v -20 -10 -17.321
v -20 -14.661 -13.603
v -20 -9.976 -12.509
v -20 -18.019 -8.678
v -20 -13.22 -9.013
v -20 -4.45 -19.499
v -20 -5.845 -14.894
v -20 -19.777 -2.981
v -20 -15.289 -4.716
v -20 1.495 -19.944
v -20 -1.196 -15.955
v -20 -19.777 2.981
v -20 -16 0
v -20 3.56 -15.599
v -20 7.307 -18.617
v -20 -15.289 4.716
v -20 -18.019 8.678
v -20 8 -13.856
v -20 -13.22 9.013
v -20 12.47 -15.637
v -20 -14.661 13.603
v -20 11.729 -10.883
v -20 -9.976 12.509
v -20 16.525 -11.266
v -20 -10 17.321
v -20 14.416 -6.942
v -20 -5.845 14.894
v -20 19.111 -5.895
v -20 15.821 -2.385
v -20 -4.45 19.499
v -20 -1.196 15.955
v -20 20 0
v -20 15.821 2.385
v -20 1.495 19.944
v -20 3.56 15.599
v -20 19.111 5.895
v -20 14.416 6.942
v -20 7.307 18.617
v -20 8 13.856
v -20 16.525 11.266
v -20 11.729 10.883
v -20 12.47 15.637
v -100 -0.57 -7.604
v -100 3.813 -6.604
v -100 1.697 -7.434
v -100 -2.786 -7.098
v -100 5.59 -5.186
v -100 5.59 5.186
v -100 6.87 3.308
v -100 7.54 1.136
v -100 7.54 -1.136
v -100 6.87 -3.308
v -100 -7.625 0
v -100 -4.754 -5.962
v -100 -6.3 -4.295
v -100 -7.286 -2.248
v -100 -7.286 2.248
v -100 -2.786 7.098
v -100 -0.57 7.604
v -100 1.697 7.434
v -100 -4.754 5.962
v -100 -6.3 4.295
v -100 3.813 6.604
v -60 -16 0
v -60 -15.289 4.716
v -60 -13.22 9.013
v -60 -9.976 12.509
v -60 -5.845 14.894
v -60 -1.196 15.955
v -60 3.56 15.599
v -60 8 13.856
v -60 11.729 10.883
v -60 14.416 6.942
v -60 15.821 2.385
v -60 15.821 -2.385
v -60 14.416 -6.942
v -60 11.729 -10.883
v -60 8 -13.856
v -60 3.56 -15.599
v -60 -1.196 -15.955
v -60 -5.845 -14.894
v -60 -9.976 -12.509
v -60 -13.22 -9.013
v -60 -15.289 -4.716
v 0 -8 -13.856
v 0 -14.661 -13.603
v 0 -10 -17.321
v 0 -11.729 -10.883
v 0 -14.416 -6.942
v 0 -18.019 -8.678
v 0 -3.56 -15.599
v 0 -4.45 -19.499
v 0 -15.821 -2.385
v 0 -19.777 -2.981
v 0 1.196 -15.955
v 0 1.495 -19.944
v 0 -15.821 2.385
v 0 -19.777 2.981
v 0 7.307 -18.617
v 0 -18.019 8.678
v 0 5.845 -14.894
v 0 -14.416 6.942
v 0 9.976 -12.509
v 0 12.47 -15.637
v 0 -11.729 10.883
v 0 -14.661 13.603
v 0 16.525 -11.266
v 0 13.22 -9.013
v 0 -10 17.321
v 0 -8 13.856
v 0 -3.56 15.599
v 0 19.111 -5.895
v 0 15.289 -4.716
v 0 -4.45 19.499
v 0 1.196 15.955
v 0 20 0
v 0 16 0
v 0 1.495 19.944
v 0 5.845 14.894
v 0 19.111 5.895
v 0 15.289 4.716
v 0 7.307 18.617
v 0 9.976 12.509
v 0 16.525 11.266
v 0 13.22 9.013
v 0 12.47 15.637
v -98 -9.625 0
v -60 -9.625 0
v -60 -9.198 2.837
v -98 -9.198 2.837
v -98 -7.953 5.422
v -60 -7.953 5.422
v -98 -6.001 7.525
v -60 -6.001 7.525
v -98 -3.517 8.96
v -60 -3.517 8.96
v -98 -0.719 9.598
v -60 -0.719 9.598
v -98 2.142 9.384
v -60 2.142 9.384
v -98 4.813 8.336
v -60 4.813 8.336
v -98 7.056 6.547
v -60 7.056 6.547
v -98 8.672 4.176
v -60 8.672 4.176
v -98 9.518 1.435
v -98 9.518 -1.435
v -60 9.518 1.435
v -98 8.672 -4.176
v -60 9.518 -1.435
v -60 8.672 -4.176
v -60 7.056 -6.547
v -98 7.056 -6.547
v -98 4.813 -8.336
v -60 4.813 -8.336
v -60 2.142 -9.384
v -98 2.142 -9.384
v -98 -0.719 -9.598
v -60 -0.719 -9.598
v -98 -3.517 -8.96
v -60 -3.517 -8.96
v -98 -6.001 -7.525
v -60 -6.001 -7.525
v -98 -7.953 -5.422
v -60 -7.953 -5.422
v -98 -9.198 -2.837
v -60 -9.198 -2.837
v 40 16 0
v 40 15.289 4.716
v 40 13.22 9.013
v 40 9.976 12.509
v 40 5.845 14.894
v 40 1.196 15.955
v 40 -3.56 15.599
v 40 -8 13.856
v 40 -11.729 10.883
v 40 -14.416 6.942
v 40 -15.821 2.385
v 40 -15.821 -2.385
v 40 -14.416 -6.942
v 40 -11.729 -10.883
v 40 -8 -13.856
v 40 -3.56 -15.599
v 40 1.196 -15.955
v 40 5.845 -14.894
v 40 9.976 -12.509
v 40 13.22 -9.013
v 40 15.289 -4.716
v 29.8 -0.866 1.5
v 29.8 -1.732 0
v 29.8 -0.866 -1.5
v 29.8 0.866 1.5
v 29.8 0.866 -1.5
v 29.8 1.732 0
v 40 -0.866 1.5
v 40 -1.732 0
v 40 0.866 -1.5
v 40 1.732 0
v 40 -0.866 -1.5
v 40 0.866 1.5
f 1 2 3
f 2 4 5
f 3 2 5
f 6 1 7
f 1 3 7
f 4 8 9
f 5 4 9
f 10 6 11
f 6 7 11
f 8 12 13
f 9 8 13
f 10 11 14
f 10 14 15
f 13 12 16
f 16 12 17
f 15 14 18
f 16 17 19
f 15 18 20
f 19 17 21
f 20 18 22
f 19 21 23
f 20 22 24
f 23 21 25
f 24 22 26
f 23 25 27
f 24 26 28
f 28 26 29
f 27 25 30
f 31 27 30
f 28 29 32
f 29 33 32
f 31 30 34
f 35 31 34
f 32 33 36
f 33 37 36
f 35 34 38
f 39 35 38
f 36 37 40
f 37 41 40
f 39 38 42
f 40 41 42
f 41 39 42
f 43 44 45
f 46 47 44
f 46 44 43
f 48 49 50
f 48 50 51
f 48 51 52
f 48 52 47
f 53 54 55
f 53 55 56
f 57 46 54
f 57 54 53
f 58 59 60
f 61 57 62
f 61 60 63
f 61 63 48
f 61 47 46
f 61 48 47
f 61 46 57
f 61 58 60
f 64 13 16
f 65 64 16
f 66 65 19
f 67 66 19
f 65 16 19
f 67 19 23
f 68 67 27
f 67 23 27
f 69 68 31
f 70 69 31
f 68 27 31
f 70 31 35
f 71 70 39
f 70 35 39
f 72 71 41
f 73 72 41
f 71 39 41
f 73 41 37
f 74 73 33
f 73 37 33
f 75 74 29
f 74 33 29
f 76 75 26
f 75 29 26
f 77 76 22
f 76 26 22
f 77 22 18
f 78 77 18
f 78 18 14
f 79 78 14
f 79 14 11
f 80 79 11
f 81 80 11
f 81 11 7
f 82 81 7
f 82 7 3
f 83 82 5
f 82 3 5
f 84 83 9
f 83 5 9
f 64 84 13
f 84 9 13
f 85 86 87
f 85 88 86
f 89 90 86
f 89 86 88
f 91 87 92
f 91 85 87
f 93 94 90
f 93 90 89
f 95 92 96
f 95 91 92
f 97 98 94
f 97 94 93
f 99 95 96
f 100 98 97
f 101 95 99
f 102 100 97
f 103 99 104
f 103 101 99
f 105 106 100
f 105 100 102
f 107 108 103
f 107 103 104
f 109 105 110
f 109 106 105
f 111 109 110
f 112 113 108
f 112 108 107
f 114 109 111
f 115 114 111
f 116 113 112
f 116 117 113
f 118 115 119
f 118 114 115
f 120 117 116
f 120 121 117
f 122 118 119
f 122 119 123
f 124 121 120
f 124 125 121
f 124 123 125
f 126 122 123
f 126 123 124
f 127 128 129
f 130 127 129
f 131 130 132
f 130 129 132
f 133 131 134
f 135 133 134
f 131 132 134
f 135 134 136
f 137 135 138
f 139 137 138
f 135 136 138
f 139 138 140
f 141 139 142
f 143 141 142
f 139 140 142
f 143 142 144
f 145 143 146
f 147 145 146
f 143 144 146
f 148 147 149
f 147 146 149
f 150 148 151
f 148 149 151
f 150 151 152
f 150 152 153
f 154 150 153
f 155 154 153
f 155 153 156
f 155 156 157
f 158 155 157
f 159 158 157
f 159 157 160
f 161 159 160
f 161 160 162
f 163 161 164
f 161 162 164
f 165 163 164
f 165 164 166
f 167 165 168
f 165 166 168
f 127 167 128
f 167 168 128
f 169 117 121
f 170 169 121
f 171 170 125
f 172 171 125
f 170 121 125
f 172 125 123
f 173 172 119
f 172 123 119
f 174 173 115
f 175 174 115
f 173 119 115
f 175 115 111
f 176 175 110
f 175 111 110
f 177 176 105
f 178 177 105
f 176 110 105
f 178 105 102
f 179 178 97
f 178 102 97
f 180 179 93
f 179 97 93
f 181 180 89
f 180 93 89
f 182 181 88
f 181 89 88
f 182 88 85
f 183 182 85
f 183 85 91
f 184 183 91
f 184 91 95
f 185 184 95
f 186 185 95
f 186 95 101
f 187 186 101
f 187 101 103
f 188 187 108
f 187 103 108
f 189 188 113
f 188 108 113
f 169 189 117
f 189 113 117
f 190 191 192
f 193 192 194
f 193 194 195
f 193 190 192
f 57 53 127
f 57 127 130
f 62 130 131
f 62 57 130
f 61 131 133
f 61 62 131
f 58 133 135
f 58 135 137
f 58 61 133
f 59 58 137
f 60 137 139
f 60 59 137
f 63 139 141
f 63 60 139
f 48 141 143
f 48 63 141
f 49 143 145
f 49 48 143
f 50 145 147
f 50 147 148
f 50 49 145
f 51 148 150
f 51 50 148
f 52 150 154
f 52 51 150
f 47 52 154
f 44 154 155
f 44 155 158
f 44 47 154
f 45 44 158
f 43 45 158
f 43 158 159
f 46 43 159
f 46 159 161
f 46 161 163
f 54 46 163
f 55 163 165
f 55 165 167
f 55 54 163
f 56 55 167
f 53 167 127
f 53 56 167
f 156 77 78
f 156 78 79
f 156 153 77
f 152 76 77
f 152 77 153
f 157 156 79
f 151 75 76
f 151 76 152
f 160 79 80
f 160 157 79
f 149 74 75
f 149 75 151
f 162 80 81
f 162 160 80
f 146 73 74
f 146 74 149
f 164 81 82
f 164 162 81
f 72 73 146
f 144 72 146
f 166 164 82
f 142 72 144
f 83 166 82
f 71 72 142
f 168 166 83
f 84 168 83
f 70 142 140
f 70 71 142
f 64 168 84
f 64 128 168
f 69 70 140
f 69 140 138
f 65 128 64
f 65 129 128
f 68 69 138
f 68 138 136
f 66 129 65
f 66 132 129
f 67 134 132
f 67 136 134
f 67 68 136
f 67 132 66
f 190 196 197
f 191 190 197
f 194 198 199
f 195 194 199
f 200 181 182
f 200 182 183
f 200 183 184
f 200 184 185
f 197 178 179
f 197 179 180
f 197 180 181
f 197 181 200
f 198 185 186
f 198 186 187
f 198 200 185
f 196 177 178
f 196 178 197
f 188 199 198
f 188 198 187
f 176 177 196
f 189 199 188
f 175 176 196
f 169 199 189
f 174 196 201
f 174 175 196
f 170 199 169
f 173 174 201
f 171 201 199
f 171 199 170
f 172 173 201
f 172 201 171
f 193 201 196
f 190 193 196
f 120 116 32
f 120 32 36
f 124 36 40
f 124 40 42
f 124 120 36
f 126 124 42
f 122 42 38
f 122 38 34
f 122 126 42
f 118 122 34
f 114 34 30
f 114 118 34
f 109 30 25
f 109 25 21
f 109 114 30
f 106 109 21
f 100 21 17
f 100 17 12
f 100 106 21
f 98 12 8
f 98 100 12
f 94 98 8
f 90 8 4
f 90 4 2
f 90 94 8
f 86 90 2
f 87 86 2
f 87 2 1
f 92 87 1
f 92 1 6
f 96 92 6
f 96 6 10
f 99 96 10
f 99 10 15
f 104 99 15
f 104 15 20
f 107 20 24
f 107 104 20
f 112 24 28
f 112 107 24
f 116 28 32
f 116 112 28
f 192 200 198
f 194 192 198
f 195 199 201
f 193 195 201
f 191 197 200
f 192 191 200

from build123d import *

# Parameters (mm, degrees)
F0_R      = 20
F1_DEPTH  = 20
F2_R      = 16
F3_DEPTH  = 40
F4_R      = 9.625258
F5_DEPTH  = 40
F6_SIZE   = 2
F7_R      = 16
F8_DEPTH  = 40
F10_DEPTH = 10.2


with BuildPart() as f1:
    # F0 (on Right) → F1 (new body)
    with BuildSketch(Plane.YZ):
        Circle(F0_R)
    extrude(amount=-F1_DEPTH)

    # F2 (on face) → F3 (join)
    with BuildSketch(Plane(origin=(-20, 0, 0), x_dir=(0, -1, 0), z_dir=(-1, 0, 0))):
        Circle(F2_R)
    extrude(amount=F3_DEPTH)

    # F4 (on face) → F5 (join)
    with BuildSketch(Plane(origin=(-60, 0, 0), x_dir=(0, -1, 0), z_dir=(-1, 0, 0))):
        Circle(F4_R)
    extrude(amount=F5_DEPTH)

    # F6
    f6_edges = [f1.edges().sort_by_distance(p)[0] for p in [
        (-100, 9.625258, 0),
    ]]
    chamfer(f6_edges, length=F6_SIZE)

    # F7 (on face) → F8 (join)
    with BuildSketch(Plane.YZ):
        Circle(F7_R)
    extrude(amount=F8_DEPTH)

    # F9 (on face) → F10 (cut)
    with BuildSketch(Plane.YZ.offset(40)):
        Polygon((-0.866025, -1.5), (0.866025, -1.5), (1.732051, 0), (0.866025, 1.5), (-0.866025, 1.5), (-1.732051, 0), align=None)
    extrude(amount=-F10_DEPTH, mode=Mode.SUBTRACT)


solid = f1.part
